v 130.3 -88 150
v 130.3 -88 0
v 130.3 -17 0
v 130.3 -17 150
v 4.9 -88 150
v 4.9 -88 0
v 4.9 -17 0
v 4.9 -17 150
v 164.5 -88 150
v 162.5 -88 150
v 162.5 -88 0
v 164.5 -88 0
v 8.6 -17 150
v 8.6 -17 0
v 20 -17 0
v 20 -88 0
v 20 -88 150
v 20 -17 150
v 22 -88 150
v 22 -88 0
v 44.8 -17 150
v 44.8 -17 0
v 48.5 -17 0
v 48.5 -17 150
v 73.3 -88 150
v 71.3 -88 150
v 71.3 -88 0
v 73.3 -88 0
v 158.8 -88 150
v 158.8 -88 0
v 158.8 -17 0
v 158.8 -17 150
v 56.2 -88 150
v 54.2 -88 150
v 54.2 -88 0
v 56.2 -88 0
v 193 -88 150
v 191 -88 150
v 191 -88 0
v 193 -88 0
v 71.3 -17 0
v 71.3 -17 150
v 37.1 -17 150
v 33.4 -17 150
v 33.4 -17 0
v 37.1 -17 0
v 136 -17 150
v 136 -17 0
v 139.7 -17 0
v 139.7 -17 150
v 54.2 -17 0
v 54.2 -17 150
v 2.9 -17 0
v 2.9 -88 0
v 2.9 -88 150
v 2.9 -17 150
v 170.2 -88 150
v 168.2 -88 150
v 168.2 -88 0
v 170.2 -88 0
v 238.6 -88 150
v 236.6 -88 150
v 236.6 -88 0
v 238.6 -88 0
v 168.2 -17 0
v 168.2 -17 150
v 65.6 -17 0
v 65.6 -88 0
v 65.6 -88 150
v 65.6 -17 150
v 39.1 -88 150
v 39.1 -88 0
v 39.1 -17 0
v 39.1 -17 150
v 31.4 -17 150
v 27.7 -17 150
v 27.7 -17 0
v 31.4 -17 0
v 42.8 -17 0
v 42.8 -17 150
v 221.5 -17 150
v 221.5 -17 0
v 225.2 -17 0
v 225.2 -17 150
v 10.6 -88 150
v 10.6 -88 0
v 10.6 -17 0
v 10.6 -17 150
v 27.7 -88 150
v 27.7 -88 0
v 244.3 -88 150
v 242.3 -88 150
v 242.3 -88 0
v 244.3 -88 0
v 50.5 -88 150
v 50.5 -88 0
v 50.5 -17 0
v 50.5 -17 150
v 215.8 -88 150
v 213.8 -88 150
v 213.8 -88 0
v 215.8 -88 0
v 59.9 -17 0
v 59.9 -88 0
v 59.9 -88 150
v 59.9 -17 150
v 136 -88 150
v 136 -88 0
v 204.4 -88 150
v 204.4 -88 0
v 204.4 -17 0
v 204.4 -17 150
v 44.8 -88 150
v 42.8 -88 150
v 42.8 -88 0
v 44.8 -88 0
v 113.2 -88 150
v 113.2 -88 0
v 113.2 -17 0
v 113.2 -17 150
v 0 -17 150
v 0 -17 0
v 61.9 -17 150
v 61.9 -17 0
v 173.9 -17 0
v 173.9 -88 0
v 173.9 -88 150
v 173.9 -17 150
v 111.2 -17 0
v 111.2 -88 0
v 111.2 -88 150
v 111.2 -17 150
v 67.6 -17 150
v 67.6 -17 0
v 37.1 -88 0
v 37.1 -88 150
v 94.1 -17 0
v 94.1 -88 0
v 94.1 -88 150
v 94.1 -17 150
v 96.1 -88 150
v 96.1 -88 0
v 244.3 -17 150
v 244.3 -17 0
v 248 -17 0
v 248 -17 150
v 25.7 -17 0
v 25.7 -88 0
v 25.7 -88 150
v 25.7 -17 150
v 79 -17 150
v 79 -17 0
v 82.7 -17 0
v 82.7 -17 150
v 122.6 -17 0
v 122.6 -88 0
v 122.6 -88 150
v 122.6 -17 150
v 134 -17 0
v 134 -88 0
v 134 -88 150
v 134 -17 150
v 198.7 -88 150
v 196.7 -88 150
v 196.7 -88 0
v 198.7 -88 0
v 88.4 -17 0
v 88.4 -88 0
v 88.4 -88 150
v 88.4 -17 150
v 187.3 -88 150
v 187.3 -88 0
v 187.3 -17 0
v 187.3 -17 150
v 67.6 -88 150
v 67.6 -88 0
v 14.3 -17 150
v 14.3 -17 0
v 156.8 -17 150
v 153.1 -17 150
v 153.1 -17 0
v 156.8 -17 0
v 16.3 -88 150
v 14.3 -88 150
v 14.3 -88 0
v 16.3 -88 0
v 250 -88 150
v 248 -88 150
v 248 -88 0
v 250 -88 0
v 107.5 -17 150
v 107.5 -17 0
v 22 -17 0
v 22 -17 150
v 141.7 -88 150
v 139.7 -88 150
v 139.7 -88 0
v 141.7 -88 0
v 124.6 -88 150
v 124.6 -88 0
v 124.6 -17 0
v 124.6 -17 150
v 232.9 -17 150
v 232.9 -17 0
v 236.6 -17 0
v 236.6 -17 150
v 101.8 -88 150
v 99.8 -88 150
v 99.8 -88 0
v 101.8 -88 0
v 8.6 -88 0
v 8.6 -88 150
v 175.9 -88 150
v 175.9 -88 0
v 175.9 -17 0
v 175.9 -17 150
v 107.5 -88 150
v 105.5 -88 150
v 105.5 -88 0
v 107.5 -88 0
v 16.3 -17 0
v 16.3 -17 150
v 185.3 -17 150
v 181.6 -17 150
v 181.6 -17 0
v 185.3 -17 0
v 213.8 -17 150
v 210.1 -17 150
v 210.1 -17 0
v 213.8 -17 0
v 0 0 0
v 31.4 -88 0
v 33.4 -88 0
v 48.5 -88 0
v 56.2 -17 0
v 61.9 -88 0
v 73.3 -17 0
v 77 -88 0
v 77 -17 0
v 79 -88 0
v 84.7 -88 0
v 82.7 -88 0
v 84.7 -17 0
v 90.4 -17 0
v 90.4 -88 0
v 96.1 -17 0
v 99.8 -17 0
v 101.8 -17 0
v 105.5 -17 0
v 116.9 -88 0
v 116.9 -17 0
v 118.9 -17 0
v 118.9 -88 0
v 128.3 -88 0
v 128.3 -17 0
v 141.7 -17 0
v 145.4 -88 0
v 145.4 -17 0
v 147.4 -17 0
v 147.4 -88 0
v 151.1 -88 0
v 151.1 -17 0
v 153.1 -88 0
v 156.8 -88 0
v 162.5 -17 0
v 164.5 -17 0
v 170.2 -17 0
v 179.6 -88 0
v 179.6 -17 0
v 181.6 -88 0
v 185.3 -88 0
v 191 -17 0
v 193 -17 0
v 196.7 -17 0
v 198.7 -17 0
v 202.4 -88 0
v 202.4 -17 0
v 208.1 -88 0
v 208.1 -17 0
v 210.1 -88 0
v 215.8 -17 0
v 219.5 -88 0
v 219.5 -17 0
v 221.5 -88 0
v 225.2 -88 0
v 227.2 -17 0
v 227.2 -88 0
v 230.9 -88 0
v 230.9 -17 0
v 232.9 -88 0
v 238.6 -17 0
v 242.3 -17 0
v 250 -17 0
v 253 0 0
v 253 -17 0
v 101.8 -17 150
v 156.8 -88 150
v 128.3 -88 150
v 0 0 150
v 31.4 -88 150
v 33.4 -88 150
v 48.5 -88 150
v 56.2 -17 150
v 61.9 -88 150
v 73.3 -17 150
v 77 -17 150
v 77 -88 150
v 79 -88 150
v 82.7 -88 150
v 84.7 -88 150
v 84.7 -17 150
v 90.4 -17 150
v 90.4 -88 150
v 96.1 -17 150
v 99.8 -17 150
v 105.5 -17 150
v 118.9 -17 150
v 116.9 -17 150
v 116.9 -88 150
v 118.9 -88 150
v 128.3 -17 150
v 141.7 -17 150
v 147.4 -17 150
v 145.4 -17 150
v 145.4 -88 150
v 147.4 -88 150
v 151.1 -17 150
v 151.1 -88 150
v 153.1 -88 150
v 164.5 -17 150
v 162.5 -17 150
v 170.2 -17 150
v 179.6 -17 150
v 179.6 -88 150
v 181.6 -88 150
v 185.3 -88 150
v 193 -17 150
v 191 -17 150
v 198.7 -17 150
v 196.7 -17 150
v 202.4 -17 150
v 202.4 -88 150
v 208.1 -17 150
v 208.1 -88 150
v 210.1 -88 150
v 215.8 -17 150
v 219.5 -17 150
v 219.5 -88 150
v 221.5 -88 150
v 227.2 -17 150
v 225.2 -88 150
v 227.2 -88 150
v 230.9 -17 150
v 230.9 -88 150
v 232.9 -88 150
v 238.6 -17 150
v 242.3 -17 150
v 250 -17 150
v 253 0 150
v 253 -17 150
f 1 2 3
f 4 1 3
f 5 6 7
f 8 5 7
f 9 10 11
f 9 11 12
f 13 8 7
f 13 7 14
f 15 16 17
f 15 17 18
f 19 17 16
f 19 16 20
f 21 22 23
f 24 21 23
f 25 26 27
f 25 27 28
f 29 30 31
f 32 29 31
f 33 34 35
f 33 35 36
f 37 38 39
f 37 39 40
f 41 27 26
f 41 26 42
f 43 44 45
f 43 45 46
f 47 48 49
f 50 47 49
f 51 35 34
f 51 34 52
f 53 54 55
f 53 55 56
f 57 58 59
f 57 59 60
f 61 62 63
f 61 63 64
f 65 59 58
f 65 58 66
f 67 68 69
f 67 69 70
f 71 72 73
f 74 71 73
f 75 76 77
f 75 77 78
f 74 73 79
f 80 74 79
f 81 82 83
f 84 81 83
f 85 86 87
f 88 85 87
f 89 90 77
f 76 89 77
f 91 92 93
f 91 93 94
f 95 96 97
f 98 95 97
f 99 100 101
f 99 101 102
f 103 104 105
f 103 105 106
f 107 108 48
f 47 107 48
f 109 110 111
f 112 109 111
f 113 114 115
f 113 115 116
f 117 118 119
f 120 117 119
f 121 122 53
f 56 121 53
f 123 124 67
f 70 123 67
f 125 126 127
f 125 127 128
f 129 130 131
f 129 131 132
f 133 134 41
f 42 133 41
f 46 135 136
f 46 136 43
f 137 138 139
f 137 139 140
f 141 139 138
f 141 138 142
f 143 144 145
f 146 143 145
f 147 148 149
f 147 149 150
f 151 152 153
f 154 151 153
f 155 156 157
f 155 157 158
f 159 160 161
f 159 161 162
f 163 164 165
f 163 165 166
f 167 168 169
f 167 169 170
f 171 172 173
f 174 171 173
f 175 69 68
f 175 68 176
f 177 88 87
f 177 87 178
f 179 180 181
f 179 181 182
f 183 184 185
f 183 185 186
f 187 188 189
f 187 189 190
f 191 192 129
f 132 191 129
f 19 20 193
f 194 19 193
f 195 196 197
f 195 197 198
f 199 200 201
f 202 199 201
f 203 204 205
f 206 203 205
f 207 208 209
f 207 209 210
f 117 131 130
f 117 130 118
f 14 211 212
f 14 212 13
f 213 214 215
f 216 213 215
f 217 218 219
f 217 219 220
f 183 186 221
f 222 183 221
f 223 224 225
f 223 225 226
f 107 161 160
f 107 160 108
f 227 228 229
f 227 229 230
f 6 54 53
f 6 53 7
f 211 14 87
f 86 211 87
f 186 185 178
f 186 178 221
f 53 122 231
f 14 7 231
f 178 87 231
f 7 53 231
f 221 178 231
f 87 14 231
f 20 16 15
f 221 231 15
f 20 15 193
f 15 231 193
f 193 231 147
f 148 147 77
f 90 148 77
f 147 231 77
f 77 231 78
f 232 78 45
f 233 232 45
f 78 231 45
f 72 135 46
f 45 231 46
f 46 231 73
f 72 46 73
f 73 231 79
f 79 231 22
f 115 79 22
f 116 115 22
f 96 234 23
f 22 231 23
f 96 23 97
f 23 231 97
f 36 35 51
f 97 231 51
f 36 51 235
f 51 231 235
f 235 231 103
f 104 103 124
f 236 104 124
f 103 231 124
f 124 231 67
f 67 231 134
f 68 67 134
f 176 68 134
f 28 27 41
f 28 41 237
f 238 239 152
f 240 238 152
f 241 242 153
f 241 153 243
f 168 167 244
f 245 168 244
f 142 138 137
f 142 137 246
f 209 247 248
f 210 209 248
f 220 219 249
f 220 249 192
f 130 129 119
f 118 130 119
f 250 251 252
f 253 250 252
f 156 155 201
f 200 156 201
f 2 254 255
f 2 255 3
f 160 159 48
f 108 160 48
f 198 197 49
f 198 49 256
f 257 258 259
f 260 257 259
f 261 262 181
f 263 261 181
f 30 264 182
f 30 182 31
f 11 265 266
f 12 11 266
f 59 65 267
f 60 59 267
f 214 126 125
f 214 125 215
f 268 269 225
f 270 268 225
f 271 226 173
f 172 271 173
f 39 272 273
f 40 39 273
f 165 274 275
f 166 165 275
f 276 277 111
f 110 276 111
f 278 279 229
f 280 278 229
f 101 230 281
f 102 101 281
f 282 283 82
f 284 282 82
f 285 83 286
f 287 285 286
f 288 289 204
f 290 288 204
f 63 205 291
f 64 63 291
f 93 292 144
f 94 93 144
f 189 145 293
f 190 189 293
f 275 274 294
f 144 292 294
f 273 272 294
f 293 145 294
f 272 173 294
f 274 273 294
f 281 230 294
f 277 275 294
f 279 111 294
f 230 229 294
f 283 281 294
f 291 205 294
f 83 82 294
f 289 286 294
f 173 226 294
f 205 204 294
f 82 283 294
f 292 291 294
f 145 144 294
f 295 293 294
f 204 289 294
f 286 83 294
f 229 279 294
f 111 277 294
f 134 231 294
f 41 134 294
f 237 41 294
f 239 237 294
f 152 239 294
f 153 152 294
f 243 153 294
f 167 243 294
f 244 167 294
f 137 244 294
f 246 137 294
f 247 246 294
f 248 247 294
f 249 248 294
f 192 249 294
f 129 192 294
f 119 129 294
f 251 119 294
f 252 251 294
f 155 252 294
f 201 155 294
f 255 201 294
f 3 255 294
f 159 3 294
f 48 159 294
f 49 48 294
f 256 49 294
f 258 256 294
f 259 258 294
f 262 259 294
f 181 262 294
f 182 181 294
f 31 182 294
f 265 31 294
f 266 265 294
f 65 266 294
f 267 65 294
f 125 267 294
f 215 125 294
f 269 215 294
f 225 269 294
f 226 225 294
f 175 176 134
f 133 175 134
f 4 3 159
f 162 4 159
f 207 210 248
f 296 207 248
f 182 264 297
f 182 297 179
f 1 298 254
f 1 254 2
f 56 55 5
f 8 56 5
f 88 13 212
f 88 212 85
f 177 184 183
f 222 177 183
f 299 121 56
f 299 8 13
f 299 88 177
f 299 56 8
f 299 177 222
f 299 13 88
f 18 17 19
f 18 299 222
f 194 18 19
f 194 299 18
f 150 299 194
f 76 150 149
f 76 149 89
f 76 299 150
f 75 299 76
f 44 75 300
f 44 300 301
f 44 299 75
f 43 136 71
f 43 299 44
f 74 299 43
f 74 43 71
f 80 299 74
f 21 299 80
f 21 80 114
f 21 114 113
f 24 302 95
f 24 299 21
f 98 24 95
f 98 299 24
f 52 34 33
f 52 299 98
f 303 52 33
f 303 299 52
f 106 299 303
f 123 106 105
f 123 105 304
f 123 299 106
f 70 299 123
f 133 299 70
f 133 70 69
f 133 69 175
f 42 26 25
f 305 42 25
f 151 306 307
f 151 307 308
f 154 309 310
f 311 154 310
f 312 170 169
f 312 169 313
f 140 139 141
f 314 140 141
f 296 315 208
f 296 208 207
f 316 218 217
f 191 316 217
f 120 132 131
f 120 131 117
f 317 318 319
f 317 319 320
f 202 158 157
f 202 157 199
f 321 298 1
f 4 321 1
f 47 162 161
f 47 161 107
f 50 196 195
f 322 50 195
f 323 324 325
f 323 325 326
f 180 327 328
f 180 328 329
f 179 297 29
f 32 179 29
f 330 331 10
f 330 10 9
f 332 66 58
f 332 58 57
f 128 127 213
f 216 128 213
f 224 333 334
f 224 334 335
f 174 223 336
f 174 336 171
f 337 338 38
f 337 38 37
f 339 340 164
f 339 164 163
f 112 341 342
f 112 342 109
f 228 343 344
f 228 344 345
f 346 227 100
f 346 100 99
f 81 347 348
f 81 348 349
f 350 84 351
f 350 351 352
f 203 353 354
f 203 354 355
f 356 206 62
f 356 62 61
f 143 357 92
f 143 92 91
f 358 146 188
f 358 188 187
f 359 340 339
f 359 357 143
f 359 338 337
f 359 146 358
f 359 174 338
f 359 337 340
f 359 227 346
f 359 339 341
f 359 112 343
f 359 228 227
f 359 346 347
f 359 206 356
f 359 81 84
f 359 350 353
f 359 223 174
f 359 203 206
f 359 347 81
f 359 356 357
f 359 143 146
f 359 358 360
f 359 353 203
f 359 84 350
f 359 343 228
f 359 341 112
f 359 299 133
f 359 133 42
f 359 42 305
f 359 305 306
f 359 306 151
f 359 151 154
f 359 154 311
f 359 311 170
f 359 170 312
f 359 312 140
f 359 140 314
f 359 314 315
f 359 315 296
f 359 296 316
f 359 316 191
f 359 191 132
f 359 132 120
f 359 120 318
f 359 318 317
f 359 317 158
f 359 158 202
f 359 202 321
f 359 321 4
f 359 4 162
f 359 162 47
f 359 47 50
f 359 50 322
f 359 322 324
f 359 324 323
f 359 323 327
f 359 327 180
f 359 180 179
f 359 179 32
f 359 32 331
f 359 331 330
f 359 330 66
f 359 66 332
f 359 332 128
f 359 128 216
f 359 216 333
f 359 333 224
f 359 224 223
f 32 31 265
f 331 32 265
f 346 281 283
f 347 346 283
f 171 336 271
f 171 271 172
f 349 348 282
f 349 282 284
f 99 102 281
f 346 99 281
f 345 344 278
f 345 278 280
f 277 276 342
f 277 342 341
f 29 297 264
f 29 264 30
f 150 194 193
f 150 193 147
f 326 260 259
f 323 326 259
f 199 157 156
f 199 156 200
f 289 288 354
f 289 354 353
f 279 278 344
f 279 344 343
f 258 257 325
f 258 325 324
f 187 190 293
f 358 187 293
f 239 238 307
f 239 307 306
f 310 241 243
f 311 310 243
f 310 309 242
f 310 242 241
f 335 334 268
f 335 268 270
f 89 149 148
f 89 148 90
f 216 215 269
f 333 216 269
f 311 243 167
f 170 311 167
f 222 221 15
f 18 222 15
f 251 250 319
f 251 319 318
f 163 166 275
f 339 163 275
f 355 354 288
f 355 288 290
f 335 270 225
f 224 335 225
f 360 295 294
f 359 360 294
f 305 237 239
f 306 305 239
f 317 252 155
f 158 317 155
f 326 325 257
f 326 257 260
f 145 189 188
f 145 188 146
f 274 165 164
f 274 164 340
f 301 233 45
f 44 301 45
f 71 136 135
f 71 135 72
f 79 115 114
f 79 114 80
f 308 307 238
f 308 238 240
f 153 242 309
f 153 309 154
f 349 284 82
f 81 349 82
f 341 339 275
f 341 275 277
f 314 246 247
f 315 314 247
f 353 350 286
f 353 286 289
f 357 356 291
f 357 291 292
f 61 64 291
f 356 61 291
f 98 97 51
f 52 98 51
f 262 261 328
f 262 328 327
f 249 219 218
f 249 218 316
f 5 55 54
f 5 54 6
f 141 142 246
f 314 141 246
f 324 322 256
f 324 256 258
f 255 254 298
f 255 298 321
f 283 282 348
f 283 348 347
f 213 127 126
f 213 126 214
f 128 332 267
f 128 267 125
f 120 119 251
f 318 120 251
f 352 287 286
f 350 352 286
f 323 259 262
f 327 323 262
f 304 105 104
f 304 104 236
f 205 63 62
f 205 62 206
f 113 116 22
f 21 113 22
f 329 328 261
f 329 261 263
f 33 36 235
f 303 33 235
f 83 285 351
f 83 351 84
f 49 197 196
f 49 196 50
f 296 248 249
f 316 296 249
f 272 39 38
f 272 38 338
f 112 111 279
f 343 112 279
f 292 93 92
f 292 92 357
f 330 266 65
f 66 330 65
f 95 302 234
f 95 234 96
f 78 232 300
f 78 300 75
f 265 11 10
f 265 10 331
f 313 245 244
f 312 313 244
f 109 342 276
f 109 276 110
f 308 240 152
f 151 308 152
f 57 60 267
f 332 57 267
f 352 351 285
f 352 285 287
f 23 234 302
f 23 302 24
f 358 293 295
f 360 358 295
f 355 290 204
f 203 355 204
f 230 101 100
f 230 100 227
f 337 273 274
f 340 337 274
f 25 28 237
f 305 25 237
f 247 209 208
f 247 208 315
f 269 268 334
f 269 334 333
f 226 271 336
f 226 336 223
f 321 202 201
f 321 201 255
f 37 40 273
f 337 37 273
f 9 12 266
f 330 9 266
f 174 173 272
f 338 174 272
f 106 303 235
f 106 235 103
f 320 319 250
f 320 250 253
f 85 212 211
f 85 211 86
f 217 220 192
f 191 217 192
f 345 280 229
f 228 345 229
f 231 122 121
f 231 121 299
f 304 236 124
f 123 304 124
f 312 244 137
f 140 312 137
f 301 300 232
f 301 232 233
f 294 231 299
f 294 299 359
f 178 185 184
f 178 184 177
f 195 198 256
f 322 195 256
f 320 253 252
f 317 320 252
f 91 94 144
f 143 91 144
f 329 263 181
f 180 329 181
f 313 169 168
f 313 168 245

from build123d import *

# Parameters (mm, degrees)
SKETCH_1_W      = 253
SKETCH_1_H      = 17
SKETCH_1_W_2    = 2
SKETCH_1_H_2    = 71
EXTRUDE_1_DEPTH = 150


with BuildPart() as part:
    # 草图1 → 凸台-拉伸1 (new body)
    with BuildSketch(Plane.XY):
        with Locations((126.5, -8.5)):
            Rectangle(SKETCH_1_W, SKETCH_1_H)
        with Locations((3.9, -52.5)):
            Rectangle(SKETCH_1_W_2, SKETCH_1_H_2)
        with Locations((9.6, -52.5)):
            Rectangle(SKETCH_1_W_2, SKETCH_1_H_2)
        with Locations((15.3, -52.5)):
            Rectangle(SKETCH_1_W_2, SKETCH_1_H_2)
        with Locations((21, -52.5)):
            Rectangle(SKETCH_1_W_2, SKETCH_1_H_2)
        with Locations((26.7, -52.5)):
            Rectangle(SKETCH_1_W_2, SKETCH_1_H_2)
        with Locations((32.4, -52.5)):
            Rectangle(SKETCH_1_W_2, SKETCH_1_H_2)
        with Locations((38.1, -52.5)):
            Rectangle(SKETCH_1_W_2, SKETCH_1_H_2)
        with Locations((43.8, -52.5)):
            Rectangle(SKETCH_1_W_2, SKETCH_1_H_2)
        with Locations((49.5, -52.5)):
            Rectangle(SKETCH_1_W_2, SKETCH_1_H_2)
        with Locations((55.2, -52.5)):
            Rectangle(SKETCH_1_W_2, SKETCH_1_H_2)
        with Locations((60.9, -52.5)):
            Rectangle(SKETCH_1_W_2, SKETCH_1_H_2)
        with Locations((66.6, -52.5)):
            Rectangle(SKETCH_1_W_2, SKETCH_1_H_2)
        with Locations((72.3, -52.5)):
            Rectangle(SKETCH_1_W_2, SKETCH_1_H_2)
        with Locations((78, -52.5)):
            Rectangle(SKETCH_1_W_2, SKETCH_1_H_2)
        with Locations((83.7, -52.5)):
            Rectangle(SKETCH_1_W_2, SKETCH_1_H_2)
        with Locations((89.4, -52.5)):
            Rectangle(SKETCH_1_W_2, SKETCH_1_H_2)
        with Locations((95.1, -52.5)):
            Rectangle(SKETCH_1_W_2, SKETCH_1_H_2)
        with Locations((100.8, -52.5)):
            Rectangle(SKETCH_1_W_2, SKETCH_1_H_2)
        with Locations((106.5, -52.5)):
            Rectangle(SKETCH_1_W_2, SKETCH_1_H_2)
        with Locations((112.2, -52.5)):
            Rectangle(SKETCH_1_W_2, SKETCH_1_H_2)
        with Locations((117.9, -52.5)):
            Rectangle(SKETCH_1_W_2, SKETCH_1_H_2)
        with Locations((123.6, -52.5)):
            Rectangle(SKETCH_1_W_2, SKETCH_1_H_2)
        with Locations((129.3, -52.5)):
            Rectangle(SKETCH_1_W_2, SKETCH_1_H_2)
        with Locations((135, -52.5)):
            Rectangle(SKETCH_1_W_2, SKETCH_1_H_2)
        with Locations((140.7, -52.5)):
            Rectangle(SKETCH_1_W_2, SKETCH_1_H_2)
        with Locations((146.4, -52.5)):
            Rectangle(SKETCH_1_W_2, SKETCH_1_H_2)
        with Locations((152.1, -52.5)):
            Rectangle(SKETCH_1_W_2, SKETCH_1_H_2)
        with Locations((157.8, -52.5)):
            Rectangle(SKETCH_1_W_2, SKETCH_1_H_2)
        with Locations((163.5, -52.5)):
            Rectangle(SKETCH_1_W_2, SKETCH_1_H_2)
        with Locations((169.2, -52.5)):
            Rectangle(SKETCH_1_W_2, SKETCH_1_H_2)
        with Locations((174.9, -52.5)):
            Rectangle(SKETCH_1_W_2, SKETCH_1_H_2)
        with Locations((180.6, -52.5)):
            Rectangle(SKETCH_1_W_2, SKETCH_1_H_2)
        with Locations((186.3, -52.5)):
            Rectangle(SKETCH_1_W_2, SKETCH_1_H_2)
        with Locations((192, -52.5)):
            Rectangle(SKETCH_1_W_2, SKETCH_1_H_2)
        with Locations((197.7, -52.5)):
            Rectangle(SKETCH_1_W_2, SKETCH_1_H_2)
        with Locations((203.4, -52.5)):
            Rectangle(SKETCH_1_W_2, SKETCH_1_H_2)
        with Locations((209.1, -52.5)):
            Rectangle(SKETCH_1_W_2, SKETCH_1_H_2)
        with Locations((214.8, -52.5)):
            Rectangle(SKETCH_1_W_2, SKETCH_1_H_2)
        with Locations((220.5, -52.5)):
            Rectangle(SKETCH_1_W_2, SKETCH_1_H_2)
        with Locations((226.2, -52.5)):
            Rectangle(SKETCH_1_W_2, SKETCH_1_H_2)
        with Locations((231.9, -52.5)):
            Rectangle(SKETCH_1_W_2, SKETCH_1_H_2)
        with Locations((237.6, -52.5)):
            Rectangle(SKETCH_1_W_2, SKETCH_1_H_2)
        with Locations((243.3, -52.5)):
            Rectangle(SKETCH_1_W_2, SKETCH_1_H_2)
        with Locations((249, -52.5)):
            Rectangle(SKETCH_1_W_2, SKETCH_1_H_2)
    extrude(amount=EXTRUDE_1_DEPTH)


solid = part.part
